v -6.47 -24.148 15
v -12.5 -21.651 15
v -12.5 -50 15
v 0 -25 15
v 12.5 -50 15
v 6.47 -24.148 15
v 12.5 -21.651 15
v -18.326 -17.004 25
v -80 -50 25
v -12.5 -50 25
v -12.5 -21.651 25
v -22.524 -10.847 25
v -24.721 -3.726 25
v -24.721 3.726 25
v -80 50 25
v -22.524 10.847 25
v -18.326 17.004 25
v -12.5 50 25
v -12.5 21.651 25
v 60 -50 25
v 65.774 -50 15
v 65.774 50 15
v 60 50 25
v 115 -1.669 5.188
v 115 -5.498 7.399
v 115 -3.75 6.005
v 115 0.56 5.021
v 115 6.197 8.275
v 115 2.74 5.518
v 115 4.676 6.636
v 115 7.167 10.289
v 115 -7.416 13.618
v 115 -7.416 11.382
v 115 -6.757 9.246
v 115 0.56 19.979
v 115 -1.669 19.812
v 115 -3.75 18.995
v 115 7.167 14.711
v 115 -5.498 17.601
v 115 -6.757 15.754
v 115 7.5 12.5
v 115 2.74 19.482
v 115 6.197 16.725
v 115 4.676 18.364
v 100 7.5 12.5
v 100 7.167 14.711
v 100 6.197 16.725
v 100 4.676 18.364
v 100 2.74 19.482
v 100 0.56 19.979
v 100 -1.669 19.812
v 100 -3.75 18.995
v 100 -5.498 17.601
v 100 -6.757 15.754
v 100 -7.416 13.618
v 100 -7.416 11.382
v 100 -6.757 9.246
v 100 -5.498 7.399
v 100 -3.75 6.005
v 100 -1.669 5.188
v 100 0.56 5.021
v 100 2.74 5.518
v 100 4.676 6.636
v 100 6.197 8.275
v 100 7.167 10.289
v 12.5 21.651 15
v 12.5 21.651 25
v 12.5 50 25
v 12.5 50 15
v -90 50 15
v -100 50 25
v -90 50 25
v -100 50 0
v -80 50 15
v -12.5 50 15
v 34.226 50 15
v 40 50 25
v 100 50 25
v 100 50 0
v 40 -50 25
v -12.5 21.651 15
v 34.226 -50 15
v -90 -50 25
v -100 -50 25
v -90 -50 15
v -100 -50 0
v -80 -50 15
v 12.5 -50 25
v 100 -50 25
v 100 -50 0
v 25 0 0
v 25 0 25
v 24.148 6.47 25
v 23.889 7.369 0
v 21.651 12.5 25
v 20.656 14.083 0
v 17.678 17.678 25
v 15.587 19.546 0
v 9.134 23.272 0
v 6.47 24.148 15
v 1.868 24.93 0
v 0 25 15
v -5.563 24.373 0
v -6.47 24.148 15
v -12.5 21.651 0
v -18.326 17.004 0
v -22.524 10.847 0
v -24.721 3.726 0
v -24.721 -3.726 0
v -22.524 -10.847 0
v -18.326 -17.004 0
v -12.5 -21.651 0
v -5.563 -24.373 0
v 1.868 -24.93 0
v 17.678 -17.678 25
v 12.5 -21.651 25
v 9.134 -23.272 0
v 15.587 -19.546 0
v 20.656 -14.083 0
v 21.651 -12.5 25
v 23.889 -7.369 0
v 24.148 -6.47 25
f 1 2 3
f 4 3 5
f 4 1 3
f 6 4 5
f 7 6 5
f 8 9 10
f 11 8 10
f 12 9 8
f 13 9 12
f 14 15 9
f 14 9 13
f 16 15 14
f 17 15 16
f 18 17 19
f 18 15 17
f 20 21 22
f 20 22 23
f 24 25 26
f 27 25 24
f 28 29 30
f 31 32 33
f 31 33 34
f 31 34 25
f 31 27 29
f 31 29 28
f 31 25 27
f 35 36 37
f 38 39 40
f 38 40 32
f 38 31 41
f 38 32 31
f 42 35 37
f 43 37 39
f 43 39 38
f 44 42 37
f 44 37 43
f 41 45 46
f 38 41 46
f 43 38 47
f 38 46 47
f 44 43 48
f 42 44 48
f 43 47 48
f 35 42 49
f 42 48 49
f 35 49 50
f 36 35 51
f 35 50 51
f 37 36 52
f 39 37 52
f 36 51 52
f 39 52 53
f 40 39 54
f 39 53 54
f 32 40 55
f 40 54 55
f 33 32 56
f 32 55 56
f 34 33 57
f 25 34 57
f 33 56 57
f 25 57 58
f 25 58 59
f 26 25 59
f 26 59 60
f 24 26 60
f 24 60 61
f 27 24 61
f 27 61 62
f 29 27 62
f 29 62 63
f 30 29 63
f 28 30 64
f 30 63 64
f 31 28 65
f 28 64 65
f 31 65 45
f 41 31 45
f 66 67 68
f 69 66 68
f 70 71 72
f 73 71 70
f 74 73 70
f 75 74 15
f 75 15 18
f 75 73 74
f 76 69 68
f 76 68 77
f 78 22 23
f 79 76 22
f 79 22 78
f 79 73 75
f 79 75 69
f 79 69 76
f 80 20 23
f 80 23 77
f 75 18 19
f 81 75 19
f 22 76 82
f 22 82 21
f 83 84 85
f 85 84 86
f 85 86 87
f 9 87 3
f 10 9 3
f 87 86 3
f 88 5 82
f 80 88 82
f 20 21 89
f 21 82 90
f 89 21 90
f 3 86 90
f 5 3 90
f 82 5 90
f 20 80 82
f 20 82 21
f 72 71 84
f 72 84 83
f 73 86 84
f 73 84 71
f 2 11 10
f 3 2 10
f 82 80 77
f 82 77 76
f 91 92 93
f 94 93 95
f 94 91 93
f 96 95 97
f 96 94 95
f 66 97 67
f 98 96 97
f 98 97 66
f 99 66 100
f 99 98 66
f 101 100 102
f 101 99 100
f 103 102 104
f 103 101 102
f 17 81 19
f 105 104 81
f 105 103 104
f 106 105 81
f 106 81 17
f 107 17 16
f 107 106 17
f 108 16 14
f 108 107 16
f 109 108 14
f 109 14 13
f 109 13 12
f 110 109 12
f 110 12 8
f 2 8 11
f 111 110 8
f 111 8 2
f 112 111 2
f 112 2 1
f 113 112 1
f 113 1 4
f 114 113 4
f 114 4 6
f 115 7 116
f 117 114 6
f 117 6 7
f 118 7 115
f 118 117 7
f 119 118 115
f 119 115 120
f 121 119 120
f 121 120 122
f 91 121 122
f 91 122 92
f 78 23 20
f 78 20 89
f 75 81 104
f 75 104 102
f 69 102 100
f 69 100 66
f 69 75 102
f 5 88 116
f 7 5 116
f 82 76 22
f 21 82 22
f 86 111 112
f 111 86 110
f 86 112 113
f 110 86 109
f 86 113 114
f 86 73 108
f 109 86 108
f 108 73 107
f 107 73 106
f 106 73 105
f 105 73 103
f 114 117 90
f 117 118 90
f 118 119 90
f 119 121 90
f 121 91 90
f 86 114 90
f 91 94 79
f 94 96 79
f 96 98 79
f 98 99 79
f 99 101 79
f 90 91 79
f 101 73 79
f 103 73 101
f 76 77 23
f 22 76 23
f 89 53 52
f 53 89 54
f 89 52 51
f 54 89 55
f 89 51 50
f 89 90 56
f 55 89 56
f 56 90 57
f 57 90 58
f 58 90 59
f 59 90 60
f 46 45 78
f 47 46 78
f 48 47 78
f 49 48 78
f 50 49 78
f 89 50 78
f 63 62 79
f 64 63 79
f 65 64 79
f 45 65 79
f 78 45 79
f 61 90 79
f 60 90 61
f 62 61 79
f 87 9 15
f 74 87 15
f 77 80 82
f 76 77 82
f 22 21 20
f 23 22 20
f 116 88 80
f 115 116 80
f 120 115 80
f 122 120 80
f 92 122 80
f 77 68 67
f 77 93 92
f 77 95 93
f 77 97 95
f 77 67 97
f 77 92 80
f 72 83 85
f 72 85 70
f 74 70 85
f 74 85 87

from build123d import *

# Parameters (mm, degrees)
F0_W     = 200
F0_H     = 100
F0_R     = 25
F1_DEPTH = 25
F2_W     = 10
F2_H     = 100
F3_DEPTH = 10
F5_DEPTH = 100
F6_R     = 7.5
F7_DEPTH = 15
F9_DEPTH = 100


with BuildPart() as f1:
    # F0 (on Top) → F1 (new body)
    with BuildSketch(Plane.XY):
        Rectangle(F0_W, F0_H)
        Circle(F0_R, mode=Mode.SUBTRACT)
    extrude(amount=F1_DEPTH)

    # F2 (on face) → F3 (cut)
    with BuildSketch(Plane.XY.offset(25)):
        with BuildLine():
            Line((-12.5, -21.650635), (-12.5, -50))
            Line((-12.5, -50), (12.5, -50))
            Line((12.5, -50), (12.5, -21.650635))
            ThreePointArc((12.5, -21.650635), (0, -25), (-12.5, -21.650635))
        make_face()
        with BuildLine():
            Line((12.5, 50), (-12.5, 50))
            Line((-12.5, 50), (-12.5, 21.650635))
            ThreePointArc((-12.5, 21.650635), (0, 25), (12.5, 21.650635))
            Line((12.5, 21.650635), (12.5, 50))
        make_face()
        with Locations((-85, 0)):
            Rectangle(F2_W, F2_H)
    extrude(amount=-F3_DEPTH, mode=Mode.SUBTRACT)

    # F4 (on face) → F5 (cut)
    with BuildSketch(Plane.XZ.offset(50)):
        Polygon((60, 25), (40, 25), (34.226497, 15), (65.773503, 15), align=None)
    extrude(amount=-F5_DEPTH, mode=Mode.SUBTRACT)

    # F6 (on face) → F7 (join)
    with BuildSketch(Plane.YZ.offset(100)):
        with Locations((0, 12.5)):
            Circle(F6_R)
    extrude(amount=F7_DEPTH)


with BuildPart() as f9:
    # F8 (on face) → F9 (new body)
    with BuildSketch(Plane.XZ.offset(50)):
        Polygon((60, 25), (40, 25), (34.226497, 15), (65.773503, 15), align=None)
    extrude(amount=-F9_DEPTH)


solid = Compound([f1.part, f9.part])
